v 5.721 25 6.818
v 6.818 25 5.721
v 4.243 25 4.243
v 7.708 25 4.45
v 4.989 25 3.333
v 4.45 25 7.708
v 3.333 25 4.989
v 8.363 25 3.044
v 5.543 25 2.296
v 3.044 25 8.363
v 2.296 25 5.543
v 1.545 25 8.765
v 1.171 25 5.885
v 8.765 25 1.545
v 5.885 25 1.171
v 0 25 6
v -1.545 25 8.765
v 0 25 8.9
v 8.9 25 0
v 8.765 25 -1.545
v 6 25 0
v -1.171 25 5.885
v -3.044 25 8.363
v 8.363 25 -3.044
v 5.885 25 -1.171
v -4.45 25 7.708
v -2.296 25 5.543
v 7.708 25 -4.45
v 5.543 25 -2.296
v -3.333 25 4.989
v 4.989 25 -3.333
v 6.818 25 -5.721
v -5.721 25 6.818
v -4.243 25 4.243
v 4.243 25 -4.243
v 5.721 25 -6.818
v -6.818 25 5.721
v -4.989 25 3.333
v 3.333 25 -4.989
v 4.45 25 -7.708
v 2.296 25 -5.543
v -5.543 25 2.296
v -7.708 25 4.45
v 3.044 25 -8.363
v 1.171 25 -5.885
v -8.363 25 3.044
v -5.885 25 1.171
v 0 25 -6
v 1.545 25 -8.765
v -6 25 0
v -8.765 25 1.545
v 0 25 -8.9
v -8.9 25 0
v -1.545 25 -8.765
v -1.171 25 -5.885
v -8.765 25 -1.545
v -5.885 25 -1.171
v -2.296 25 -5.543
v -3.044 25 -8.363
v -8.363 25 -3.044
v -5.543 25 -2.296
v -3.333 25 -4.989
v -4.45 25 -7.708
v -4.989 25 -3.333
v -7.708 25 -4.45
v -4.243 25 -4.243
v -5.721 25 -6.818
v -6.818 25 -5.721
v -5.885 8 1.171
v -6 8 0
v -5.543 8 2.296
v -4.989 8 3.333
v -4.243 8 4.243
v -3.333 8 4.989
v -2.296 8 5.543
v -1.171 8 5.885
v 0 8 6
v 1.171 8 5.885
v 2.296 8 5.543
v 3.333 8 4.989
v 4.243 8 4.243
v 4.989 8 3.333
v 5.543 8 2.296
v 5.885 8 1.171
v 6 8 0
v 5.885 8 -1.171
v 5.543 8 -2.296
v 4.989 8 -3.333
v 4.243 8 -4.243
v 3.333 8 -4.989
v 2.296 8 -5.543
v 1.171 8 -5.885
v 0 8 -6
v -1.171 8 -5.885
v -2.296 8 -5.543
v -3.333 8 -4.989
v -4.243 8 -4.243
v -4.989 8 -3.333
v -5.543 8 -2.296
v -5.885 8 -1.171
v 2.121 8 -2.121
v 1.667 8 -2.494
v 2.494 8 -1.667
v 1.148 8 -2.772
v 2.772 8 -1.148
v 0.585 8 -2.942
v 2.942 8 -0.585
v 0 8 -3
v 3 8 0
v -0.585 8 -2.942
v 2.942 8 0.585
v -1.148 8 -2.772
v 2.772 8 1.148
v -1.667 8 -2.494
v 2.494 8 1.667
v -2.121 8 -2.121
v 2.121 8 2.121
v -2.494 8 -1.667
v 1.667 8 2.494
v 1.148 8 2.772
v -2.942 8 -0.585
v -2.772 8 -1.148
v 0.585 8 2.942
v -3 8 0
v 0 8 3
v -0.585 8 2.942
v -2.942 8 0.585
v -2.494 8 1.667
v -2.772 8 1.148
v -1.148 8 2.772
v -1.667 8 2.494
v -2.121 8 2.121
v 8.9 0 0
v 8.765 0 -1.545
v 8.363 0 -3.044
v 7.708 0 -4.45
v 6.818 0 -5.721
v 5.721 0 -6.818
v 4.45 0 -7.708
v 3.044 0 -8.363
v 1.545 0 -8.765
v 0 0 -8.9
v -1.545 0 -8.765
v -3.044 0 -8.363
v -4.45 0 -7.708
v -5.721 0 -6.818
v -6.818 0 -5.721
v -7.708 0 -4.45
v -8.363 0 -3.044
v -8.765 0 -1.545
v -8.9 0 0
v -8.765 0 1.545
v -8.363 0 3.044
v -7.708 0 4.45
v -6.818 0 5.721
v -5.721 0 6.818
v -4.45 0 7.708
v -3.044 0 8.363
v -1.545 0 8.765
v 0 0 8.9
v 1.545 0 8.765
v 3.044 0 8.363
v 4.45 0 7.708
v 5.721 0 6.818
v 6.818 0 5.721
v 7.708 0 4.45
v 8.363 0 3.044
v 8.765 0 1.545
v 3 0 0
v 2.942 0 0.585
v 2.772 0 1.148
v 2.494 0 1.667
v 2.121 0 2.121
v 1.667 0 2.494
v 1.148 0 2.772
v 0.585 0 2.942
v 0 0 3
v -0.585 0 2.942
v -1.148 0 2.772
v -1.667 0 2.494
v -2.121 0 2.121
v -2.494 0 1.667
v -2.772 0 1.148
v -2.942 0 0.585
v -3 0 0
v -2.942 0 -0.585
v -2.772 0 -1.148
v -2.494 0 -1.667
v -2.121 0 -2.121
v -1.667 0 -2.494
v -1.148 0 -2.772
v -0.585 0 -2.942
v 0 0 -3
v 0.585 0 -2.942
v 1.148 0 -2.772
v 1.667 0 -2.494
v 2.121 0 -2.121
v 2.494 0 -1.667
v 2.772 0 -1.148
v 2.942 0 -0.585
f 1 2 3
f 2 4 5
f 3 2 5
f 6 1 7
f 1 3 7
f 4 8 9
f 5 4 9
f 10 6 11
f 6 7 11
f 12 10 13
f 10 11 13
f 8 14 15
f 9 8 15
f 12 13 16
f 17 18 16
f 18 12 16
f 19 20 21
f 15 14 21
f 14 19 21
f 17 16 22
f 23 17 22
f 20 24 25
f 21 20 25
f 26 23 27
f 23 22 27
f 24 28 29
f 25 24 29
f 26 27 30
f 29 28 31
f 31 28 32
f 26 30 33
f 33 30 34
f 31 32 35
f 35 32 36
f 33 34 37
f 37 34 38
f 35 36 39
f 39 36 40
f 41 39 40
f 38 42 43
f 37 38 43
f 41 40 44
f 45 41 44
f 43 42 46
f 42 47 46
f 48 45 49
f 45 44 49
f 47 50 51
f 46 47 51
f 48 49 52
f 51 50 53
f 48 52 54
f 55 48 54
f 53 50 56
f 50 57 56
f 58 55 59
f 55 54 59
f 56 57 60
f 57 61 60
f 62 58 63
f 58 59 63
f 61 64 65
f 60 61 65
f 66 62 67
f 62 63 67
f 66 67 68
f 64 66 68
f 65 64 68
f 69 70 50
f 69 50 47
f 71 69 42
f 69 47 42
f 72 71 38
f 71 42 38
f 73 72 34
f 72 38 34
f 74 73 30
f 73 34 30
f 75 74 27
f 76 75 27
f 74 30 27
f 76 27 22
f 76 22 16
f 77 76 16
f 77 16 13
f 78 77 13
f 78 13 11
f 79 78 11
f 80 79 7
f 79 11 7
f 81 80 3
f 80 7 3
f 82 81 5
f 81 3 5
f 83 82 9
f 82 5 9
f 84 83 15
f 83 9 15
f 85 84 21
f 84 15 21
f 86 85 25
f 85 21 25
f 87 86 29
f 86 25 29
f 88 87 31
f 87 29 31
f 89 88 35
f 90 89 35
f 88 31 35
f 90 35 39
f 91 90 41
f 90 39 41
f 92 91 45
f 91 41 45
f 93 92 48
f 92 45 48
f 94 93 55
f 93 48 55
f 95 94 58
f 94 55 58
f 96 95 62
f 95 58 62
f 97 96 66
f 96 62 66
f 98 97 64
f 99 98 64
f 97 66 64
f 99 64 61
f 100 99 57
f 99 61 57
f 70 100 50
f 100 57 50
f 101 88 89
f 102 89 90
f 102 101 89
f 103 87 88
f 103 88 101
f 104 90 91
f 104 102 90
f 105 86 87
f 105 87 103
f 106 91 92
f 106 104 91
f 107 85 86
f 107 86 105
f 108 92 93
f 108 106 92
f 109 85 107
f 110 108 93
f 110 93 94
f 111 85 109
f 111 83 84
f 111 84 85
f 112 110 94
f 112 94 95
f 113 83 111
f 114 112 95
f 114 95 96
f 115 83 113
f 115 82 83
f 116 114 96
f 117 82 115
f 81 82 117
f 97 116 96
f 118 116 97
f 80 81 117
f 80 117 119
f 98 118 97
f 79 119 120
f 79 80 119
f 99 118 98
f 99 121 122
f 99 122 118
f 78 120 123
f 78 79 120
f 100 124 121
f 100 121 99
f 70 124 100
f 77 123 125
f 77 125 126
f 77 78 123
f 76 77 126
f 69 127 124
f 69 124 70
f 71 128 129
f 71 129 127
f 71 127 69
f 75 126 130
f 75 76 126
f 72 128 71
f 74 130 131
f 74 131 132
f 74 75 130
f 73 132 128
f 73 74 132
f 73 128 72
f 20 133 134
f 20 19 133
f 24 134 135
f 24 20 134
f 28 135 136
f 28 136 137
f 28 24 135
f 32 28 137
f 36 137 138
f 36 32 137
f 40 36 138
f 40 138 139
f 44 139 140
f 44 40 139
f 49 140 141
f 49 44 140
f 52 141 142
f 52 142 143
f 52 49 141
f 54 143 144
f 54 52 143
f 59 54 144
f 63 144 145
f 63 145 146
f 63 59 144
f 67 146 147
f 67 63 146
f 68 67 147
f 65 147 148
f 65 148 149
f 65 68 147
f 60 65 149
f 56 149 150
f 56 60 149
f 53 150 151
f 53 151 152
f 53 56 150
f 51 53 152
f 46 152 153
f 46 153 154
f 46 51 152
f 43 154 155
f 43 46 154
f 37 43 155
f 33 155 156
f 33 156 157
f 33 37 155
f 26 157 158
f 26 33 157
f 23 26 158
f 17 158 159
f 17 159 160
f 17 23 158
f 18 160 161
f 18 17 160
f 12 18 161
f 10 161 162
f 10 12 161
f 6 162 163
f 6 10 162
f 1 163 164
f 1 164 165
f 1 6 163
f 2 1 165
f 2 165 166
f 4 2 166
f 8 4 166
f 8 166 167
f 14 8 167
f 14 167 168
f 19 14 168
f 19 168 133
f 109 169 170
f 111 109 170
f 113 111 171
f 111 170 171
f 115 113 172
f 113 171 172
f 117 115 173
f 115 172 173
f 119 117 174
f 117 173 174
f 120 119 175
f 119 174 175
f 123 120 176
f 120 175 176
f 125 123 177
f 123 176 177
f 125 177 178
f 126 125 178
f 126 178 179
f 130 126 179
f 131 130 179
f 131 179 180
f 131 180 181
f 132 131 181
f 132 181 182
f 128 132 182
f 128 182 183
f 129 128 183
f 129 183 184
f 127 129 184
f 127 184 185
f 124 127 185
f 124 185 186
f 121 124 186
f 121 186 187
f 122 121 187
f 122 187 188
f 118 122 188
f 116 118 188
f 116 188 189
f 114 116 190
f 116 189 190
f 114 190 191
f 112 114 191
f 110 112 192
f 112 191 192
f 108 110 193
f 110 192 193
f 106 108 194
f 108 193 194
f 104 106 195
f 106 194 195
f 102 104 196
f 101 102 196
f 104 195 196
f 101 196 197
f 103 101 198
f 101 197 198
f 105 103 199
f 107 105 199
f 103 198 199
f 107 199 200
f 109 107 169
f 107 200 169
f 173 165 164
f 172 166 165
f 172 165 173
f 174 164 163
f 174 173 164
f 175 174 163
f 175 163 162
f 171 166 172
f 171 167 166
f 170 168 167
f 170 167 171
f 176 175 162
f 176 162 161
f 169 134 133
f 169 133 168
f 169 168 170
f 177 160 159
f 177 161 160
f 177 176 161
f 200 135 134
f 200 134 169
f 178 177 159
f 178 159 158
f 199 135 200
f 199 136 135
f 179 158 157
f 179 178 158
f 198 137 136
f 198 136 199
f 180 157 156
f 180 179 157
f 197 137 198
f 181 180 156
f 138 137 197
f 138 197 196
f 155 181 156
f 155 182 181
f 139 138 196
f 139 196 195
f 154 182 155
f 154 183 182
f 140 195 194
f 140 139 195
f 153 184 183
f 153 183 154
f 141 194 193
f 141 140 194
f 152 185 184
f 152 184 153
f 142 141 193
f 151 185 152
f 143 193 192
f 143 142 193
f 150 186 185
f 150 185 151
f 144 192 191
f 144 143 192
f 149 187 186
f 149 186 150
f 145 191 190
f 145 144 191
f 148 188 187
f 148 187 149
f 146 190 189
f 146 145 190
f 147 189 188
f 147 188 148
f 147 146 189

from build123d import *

# Parameters (mm, degrees)
CROQUIS1_W            = 8.9
CROQUIS1_H            = 25
CROQUIS2_R            = 6
CORTAR_EXTRUIR1_DEPTH = 17
CROQUIS3_R            = 3
CORTAR_EXTRUIR2_DEPTH = 12.5


with BuildPart() as part:
    # Croquis1 → Revolución1 (revolve)
    with BuildSketch(Plane.XY):
        with Locations((4.45, 12.5)):
            Rectangle(CROQUIS1_W, CROQUIS1_H)
    revolve(axis=Axis((0, 0, 0), (0, 1, 0)))

    # Croquis2 → Cortar-Extruir1 (cut)
    with BuildSketch(Plane(origin=(0, 25, 0), x_dir=(1, 0, 0), z_dir=(0, 1, 0))):
        with Locations(Location((0, 0, 0), (0, 0, 180))):
            Circle(CROQUIS2_R)
    extrude(amount=-CORTAR_EXTRUIR1_DEPTH, mode=Mode.SUBTRACT)

    # Croquis3 → Cortar-Extruir2 (cut)
    with BuildSketch(Plane.XZ):
        Circle(CROQUIS3_R)
    extrude(amount=-CORTAR_EXTRUIR2_DEPTH, mode=Mode.SUBTRACT)


solid = part.part
